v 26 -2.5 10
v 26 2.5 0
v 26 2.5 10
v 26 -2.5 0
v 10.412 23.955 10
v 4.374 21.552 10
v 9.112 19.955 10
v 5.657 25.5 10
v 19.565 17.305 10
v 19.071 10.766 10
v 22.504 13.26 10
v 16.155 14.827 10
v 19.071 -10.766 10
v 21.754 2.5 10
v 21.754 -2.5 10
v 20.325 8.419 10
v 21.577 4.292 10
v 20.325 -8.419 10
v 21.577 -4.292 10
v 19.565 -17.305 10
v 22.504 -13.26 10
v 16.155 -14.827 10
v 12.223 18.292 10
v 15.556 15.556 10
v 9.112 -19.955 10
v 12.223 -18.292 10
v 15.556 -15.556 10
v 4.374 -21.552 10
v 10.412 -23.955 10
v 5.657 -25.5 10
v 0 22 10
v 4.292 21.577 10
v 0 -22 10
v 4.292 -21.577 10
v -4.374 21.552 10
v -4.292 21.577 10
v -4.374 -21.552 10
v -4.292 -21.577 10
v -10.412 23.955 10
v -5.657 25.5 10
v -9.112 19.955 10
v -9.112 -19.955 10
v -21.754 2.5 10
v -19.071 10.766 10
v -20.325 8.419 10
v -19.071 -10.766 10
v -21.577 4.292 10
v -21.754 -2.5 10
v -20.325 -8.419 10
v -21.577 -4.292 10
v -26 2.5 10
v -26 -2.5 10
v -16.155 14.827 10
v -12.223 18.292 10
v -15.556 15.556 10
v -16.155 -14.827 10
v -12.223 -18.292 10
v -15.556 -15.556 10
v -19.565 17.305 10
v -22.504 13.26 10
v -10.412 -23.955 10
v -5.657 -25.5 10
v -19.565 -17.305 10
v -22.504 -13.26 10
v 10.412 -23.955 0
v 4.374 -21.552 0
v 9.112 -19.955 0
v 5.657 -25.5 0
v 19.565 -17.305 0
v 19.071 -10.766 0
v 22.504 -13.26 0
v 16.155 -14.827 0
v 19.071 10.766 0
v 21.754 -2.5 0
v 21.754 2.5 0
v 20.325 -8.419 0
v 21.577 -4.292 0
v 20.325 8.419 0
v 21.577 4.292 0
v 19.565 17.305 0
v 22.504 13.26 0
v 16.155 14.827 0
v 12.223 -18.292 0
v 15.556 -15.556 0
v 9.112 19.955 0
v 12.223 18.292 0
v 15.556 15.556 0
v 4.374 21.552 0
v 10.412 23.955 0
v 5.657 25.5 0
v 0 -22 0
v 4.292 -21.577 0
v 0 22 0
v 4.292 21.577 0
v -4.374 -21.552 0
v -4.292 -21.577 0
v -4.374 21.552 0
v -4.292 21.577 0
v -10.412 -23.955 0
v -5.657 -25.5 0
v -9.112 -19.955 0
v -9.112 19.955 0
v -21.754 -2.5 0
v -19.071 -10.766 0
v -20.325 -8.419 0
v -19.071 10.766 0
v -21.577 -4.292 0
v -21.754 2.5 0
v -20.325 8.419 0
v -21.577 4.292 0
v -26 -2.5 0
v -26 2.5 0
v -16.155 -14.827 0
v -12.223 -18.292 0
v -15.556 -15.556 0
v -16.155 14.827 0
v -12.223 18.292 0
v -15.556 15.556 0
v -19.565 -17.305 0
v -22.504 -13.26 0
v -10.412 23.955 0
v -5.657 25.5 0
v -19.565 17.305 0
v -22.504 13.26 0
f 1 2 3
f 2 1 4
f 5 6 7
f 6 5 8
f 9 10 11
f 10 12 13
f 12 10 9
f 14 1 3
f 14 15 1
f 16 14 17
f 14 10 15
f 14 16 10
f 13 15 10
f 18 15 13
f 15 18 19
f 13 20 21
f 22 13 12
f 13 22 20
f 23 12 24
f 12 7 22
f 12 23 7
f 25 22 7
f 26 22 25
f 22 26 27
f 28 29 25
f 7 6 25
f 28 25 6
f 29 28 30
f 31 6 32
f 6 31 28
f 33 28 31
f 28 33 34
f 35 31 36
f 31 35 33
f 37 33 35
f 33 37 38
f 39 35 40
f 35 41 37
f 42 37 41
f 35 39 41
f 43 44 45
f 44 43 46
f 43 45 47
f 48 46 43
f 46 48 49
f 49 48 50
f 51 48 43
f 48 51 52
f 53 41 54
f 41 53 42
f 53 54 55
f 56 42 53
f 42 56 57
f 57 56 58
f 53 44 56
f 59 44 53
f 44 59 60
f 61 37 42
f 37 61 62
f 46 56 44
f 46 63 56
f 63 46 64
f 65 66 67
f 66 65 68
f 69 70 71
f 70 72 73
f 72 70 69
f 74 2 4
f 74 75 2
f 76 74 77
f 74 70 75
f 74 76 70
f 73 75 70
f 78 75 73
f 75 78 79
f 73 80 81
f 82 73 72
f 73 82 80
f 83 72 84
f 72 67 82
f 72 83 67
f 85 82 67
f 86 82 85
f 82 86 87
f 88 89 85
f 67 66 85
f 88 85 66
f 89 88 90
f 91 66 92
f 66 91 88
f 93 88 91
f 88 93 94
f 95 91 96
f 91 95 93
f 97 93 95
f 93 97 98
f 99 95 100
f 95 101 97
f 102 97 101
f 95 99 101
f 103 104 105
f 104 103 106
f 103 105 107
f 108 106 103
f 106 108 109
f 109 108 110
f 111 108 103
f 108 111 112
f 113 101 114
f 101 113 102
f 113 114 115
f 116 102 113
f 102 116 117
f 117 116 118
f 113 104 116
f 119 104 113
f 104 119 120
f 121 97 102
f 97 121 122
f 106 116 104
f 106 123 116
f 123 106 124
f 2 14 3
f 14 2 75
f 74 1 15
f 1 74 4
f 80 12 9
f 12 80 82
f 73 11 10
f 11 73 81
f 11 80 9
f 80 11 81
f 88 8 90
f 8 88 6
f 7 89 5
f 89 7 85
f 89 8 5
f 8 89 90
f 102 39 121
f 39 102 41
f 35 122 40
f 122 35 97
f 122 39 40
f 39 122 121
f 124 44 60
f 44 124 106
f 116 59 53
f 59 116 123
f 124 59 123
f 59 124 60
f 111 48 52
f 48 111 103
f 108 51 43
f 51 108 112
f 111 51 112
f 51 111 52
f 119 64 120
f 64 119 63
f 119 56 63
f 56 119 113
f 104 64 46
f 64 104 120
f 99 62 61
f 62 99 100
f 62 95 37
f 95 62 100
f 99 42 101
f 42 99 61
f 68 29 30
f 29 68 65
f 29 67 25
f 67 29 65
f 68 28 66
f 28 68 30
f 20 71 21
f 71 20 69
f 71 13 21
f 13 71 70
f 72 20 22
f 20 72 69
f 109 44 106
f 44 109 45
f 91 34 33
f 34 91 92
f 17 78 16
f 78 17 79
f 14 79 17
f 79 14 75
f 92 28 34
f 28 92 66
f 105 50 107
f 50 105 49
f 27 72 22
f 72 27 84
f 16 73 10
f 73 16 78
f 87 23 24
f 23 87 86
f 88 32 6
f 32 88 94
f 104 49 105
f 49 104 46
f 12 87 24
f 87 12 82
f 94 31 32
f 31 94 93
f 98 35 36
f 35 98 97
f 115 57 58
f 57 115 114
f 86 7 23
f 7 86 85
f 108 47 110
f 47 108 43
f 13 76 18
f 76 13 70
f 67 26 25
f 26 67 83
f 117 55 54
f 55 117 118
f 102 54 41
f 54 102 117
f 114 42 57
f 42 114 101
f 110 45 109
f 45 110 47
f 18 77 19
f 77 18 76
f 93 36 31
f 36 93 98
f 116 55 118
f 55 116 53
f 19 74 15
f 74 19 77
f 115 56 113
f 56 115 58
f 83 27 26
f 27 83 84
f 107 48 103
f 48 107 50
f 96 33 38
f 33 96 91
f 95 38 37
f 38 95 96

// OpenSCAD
$fn = 32;

// ----------------------------------------------------------------------
// Spur blank: plain gear blank
// ----------------------------------------------------------------------

// --- parameters (mm) ---
disc_r = 22;              // blank root radius
disc_t = 10;              // blank thickness
n_teeth = 10;             // stub tooth count
tooth_w = 5;              // tooth width at the root
tooth_h = 4;              // tooth height above the root

out_r = disc_r + tooth_h;  // tip radius
bbox_x = 52.0;  // measured width over the teeth
bbox_y = 51.0;  // measured depth over the teeth

union() {
  cylinder(r = disc_r, h = disc_t);
  for (i = [0 : n_teeth - 1])
    rotate([0, 0, i * 360 / n_teeth])
      translate([disc_r - 1, -tooth_w / 2, 0])
        cube([tooth_h + 1, tooth_w, disc_t]);
}
